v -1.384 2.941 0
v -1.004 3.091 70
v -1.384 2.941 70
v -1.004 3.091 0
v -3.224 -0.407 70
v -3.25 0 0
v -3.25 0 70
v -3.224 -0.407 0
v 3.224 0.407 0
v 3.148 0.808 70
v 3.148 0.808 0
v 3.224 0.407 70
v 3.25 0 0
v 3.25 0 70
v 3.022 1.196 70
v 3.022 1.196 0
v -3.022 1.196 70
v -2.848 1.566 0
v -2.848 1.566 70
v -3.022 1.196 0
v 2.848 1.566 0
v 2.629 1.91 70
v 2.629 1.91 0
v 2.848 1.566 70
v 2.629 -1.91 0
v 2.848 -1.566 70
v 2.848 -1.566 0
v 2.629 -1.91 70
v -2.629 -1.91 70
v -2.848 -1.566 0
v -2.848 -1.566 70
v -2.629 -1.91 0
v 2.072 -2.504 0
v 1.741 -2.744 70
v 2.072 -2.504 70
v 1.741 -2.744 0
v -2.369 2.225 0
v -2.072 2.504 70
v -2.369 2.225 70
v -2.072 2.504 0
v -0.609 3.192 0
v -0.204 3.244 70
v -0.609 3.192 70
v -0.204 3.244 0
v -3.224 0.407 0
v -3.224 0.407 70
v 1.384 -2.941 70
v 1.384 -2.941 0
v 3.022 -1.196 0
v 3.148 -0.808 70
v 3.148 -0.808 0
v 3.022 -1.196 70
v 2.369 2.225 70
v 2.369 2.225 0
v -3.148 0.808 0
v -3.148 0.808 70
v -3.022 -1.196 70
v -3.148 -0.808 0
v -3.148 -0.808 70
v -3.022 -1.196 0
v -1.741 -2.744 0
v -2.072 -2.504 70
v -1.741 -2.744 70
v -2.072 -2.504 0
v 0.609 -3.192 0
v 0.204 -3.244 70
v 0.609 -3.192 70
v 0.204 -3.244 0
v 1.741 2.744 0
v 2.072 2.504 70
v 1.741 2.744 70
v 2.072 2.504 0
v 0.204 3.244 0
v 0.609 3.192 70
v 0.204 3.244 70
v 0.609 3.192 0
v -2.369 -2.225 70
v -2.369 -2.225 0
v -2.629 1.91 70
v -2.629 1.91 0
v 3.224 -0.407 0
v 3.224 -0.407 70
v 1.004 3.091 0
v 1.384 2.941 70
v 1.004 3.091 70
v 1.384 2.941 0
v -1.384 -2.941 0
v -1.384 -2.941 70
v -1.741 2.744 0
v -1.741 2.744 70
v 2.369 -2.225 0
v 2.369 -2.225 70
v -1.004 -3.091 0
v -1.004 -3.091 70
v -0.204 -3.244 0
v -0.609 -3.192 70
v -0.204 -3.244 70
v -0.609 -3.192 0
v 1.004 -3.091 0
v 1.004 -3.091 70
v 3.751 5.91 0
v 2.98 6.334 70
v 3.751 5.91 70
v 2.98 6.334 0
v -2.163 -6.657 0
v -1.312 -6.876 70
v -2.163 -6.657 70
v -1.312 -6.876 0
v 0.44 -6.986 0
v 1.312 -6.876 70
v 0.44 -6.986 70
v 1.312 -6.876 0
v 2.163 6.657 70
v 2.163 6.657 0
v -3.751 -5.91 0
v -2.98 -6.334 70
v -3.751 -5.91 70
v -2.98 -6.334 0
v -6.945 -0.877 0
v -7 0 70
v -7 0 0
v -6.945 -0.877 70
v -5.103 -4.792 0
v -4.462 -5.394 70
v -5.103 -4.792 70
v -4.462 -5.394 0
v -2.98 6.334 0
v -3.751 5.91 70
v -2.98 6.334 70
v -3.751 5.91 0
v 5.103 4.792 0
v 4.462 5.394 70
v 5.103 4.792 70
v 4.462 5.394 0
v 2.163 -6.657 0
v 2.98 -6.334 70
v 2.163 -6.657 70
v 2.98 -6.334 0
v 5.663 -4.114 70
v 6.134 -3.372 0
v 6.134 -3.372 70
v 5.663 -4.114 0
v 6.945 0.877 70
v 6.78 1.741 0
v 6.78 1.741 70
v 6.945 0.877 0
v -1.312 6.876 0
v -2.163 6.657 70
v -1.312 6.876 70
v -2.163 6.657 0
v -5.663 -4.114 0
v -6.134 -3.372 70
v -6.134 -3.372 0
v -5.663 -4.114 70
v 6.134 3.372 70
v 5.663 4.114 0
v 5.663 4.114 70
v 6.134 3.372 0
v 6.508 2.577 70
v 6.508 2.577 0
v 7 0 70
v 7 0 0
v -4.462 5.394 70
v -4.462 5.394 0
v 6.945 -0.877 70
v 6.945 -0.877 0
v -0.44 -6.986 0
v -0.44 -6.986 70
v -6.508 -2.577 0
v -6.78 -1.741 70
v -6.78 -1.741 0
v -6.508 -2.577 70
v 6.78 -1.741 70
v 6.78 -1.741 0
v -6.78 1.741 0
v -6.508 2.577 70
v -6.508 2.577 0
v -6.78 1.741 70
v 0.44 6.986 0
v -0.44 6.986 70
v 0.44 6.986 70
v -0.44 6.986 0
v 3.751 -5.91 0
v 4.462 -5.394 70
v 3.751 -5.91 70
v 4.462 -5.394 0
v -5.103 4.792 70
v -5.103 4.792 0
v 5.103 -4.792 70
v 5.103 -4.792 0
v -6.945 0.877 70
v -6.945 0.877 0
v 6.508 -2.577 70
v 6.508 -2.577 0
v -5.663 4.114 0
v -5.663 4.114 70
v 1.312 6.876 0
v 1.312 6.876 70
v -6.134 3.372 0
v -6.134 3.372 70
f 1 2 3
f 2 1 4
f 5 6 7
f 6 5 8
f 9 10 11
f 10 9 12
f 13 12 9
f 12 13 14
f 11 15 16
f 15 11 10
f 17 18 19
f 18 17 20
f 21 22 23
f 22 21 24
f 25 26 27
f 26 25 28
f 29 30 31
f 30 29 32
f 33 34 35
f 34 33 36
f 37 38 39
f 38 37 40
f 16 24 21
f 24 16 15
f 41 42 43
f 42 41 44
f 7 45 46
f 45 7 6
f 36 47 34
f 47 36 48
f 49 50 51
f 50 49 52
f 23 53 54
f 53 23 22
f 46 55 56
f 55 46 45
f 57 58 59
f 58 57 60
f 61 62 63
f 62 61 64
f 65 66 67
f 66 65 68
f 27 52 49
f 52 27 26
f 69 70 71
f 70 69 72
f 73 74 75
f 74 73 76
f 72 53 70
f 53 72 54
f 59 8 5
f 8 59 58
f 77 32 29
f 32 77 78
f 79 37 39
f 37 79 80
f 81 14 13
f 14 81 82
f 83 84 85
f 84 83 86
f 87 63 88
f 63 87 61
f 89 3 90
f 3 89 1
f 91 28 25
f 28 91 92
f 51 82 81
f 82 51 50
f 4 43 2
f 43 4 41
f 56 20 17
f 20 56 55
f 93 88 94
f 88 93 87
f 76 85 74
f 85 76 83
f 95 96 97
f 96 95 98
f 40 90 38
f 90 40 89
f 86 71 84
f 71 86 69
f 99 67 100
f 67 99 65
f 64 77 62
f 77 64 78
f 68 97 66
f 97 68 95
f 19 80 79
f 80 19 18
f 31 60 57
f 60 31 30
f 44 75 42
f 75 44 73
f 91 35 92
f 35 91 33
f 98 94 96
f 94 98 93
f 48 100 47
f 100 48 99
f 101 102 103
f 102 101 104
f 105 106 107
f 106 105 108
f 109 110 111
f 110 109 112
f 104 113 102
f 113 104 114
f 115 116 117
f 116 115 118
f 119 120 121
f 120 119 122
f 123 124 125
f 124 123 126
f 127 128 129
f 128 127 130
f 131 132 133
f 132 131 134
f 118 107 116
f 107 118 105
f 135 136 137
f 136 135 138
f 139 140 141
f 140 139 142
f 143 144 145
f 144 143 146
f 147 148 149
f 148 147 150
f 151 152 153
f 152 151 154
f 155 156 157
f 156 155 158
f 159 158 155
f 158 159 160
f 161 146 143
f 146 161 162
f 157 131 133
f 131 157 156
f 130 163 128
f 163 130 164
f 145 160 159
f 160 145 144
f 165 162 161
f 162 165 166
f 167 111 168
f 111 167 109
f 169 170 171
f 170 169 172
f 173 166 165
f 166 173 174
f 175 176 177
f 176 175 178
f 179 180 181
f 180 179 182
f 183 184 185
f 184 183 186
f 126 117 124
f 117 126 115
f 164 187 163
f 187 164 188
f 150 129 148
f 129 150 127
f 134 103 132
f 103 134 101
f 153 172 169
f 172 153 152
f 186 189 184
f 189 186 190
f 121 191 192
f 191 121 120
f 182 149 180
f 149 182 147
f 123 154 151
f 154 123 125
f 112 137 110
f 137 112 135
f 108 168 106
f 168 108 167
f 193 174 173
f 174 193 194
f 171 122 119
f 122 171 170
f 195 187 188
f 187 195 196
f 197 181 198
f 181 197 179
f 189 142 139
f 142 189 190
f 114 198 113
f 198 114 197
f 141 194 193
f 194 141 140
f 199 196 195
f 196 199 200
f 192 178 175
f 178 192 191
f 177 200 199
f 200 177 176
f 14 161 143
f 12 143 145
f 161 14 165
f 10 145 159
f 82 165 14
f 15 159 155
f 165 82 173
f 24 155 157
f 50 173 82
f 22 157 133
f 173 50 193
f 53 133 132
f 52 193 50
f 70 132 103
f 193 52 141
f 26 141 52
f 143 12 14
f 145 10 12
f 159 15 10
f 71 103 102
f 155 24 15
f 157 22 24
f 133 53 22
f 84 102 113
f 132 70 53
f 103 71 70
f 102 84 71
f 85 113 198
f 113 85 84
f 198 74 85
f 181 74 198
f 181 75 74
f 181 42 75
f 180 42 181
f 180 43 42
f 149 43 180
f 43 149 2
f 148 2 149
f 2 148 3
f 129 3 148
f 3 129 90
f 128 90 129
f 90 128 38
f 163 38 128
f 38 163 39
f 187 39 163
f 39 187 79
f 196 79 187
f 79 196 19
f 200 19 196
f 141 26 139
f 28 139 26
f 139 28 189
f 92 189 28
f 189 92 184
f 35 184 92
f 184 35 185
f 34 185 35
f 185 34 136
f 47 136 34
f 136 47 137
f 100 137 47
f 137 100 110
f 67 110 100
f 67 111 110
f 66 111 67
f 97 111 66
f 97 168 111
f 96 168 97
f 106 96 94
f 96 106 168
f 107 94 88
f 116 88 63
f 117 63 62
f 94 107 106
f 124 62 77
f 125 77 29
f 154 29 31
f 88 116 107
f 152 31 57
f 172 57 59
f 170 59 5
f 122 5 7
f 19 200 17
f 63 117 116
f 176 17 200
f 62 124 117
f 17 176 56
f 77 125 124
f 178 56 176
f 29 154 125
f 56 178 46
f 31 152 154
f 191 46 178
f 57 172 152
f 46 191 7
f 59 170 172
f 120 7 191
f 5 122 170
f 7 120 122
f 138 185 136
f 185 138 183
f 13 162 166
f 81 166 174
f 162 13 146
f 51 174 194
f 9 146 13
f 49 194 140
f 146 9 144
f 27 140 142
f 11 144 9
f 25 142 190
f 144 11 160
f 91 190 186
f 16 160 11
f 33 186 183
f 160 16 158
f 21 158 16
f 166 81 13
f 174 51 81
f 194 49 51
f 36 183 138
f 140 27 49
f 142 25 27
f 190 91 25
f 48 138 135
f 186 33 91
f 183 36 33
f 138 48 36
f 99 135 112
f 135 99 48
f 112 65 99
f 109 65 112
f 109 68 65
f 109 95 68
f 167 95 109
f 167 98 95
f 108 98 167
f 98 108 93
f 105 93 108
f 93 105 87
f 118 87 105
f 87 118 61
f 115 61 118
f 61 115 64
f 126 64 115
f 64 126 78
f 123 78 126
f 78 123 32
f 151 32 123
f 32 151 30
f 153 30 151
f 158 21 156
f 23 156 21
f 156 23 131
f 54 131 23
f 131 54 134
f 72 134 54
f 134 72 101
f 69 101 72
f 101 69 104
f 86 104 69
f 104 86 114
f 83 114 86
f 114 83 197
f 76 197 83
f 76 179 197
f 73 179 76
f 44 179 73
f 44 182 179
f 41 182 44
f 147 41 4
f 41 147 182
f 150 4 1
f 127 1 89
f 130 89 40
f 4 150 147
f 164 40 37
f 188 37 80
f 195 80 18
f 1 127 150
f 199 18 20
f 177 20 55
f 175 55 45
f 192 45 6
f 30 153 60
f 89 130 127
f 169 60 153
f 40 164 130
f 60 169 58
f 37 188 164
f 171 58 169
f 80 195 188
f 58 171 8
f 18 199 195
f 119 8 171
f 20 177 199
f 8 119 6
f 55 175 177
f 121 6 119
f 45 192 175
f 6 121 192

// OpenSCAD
$fn = 50;

difference() {
	union() {
		cylinder(h = 70, r = 7.0);
	}
	union() {
		translate(v = [0, 0, -100]) {
			cylinder(h = 200, r = 3.25);
		}
		translate(v = [0, 0, -100]) {
			cylinder(h = 200, r = 1.8);
		}
	}
}
